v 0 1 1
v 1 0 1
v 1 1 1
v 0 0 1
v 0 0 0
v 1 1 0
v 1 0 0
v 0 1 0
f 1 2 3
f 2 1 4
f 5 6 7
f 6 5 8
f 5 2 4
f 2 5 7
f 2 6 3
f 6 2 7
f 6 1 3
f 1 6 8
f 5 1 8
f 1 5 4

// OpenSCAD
matrix_3x3 = [[10,20,30],[10,20,30],[10,20,30]];
vector = [2,0,0];
matrix_3x2 = [[1,0,0],[1,0,0]];

group0 = ["3x3matrix","vector","number","3x2matrix"];
group1 = [	matrix_3x3, vector, 2, matrix_3x2];

function multiply(a,b) = a * b;
function divide(a,b) = a / b;
function add(a,b) = a + b;
function minus(a,b) = a - b;
function modulus(a,b) = a % b;

function lt(a,b) = a < b;
function lte(a,b) = a <= b;
function eq(a,b) = a == b;
function neq(a,b) = a != b;
function gt(a,b) = a > b;
function gte(a,b) = a >= b;

group1_len = len(group1);
for (i = [0:group1_len-1]){
	for (j = [0:group1_len-1]){
		echo(str(group0[i]," * ",group0[j], " = "),multiply(group1[i],group1[j]));
		echo(str(group0[i]," / ",group0[j], " = "),divide(group1[i],group1[j]));
		echo(str(group0[i]," + ",group0[j], " = "),add(group1[i],group1[j]));
		echo(str(group0[i]," - ",group0[j], " = "),minus(group1[i],group1[j]));
		echo(str(group0[i]," % ",group0[j], " = "),modulus(group1[i],group1[j]));
		echo(str(group0[i]," < ",group0[j], " = "),lt(group1[i],group1[j]));
		echo(str(group0[i]," <= ",group0[j], " = "),lte(group1[i],group1[j]));
		echo(str(group0[i]," == ",group0[j], " = "),eq(group1[i],group1[j]));
		echo(str(group0[i]," != ",group0[j], " = "),neq(group1[i],group1[j]));
		echo(str(group0[i]," > ",group0[j], " = "),gt(group1[i],group1[j]));
		echo(str(group0[i]," >= ",group0[j], " = "),gte(group1[i],group1[j]));
	}
}
echo("----");
echo("!");
echo("! matrix ", !matrix_3x3);
echo("! vector ", !vector);
echo("----");

echo("?:");
echo("?: matrix ", matrix_3x3?true:false);
echo("?: vextor ", vector?true:false);
echo("----");

cube();
